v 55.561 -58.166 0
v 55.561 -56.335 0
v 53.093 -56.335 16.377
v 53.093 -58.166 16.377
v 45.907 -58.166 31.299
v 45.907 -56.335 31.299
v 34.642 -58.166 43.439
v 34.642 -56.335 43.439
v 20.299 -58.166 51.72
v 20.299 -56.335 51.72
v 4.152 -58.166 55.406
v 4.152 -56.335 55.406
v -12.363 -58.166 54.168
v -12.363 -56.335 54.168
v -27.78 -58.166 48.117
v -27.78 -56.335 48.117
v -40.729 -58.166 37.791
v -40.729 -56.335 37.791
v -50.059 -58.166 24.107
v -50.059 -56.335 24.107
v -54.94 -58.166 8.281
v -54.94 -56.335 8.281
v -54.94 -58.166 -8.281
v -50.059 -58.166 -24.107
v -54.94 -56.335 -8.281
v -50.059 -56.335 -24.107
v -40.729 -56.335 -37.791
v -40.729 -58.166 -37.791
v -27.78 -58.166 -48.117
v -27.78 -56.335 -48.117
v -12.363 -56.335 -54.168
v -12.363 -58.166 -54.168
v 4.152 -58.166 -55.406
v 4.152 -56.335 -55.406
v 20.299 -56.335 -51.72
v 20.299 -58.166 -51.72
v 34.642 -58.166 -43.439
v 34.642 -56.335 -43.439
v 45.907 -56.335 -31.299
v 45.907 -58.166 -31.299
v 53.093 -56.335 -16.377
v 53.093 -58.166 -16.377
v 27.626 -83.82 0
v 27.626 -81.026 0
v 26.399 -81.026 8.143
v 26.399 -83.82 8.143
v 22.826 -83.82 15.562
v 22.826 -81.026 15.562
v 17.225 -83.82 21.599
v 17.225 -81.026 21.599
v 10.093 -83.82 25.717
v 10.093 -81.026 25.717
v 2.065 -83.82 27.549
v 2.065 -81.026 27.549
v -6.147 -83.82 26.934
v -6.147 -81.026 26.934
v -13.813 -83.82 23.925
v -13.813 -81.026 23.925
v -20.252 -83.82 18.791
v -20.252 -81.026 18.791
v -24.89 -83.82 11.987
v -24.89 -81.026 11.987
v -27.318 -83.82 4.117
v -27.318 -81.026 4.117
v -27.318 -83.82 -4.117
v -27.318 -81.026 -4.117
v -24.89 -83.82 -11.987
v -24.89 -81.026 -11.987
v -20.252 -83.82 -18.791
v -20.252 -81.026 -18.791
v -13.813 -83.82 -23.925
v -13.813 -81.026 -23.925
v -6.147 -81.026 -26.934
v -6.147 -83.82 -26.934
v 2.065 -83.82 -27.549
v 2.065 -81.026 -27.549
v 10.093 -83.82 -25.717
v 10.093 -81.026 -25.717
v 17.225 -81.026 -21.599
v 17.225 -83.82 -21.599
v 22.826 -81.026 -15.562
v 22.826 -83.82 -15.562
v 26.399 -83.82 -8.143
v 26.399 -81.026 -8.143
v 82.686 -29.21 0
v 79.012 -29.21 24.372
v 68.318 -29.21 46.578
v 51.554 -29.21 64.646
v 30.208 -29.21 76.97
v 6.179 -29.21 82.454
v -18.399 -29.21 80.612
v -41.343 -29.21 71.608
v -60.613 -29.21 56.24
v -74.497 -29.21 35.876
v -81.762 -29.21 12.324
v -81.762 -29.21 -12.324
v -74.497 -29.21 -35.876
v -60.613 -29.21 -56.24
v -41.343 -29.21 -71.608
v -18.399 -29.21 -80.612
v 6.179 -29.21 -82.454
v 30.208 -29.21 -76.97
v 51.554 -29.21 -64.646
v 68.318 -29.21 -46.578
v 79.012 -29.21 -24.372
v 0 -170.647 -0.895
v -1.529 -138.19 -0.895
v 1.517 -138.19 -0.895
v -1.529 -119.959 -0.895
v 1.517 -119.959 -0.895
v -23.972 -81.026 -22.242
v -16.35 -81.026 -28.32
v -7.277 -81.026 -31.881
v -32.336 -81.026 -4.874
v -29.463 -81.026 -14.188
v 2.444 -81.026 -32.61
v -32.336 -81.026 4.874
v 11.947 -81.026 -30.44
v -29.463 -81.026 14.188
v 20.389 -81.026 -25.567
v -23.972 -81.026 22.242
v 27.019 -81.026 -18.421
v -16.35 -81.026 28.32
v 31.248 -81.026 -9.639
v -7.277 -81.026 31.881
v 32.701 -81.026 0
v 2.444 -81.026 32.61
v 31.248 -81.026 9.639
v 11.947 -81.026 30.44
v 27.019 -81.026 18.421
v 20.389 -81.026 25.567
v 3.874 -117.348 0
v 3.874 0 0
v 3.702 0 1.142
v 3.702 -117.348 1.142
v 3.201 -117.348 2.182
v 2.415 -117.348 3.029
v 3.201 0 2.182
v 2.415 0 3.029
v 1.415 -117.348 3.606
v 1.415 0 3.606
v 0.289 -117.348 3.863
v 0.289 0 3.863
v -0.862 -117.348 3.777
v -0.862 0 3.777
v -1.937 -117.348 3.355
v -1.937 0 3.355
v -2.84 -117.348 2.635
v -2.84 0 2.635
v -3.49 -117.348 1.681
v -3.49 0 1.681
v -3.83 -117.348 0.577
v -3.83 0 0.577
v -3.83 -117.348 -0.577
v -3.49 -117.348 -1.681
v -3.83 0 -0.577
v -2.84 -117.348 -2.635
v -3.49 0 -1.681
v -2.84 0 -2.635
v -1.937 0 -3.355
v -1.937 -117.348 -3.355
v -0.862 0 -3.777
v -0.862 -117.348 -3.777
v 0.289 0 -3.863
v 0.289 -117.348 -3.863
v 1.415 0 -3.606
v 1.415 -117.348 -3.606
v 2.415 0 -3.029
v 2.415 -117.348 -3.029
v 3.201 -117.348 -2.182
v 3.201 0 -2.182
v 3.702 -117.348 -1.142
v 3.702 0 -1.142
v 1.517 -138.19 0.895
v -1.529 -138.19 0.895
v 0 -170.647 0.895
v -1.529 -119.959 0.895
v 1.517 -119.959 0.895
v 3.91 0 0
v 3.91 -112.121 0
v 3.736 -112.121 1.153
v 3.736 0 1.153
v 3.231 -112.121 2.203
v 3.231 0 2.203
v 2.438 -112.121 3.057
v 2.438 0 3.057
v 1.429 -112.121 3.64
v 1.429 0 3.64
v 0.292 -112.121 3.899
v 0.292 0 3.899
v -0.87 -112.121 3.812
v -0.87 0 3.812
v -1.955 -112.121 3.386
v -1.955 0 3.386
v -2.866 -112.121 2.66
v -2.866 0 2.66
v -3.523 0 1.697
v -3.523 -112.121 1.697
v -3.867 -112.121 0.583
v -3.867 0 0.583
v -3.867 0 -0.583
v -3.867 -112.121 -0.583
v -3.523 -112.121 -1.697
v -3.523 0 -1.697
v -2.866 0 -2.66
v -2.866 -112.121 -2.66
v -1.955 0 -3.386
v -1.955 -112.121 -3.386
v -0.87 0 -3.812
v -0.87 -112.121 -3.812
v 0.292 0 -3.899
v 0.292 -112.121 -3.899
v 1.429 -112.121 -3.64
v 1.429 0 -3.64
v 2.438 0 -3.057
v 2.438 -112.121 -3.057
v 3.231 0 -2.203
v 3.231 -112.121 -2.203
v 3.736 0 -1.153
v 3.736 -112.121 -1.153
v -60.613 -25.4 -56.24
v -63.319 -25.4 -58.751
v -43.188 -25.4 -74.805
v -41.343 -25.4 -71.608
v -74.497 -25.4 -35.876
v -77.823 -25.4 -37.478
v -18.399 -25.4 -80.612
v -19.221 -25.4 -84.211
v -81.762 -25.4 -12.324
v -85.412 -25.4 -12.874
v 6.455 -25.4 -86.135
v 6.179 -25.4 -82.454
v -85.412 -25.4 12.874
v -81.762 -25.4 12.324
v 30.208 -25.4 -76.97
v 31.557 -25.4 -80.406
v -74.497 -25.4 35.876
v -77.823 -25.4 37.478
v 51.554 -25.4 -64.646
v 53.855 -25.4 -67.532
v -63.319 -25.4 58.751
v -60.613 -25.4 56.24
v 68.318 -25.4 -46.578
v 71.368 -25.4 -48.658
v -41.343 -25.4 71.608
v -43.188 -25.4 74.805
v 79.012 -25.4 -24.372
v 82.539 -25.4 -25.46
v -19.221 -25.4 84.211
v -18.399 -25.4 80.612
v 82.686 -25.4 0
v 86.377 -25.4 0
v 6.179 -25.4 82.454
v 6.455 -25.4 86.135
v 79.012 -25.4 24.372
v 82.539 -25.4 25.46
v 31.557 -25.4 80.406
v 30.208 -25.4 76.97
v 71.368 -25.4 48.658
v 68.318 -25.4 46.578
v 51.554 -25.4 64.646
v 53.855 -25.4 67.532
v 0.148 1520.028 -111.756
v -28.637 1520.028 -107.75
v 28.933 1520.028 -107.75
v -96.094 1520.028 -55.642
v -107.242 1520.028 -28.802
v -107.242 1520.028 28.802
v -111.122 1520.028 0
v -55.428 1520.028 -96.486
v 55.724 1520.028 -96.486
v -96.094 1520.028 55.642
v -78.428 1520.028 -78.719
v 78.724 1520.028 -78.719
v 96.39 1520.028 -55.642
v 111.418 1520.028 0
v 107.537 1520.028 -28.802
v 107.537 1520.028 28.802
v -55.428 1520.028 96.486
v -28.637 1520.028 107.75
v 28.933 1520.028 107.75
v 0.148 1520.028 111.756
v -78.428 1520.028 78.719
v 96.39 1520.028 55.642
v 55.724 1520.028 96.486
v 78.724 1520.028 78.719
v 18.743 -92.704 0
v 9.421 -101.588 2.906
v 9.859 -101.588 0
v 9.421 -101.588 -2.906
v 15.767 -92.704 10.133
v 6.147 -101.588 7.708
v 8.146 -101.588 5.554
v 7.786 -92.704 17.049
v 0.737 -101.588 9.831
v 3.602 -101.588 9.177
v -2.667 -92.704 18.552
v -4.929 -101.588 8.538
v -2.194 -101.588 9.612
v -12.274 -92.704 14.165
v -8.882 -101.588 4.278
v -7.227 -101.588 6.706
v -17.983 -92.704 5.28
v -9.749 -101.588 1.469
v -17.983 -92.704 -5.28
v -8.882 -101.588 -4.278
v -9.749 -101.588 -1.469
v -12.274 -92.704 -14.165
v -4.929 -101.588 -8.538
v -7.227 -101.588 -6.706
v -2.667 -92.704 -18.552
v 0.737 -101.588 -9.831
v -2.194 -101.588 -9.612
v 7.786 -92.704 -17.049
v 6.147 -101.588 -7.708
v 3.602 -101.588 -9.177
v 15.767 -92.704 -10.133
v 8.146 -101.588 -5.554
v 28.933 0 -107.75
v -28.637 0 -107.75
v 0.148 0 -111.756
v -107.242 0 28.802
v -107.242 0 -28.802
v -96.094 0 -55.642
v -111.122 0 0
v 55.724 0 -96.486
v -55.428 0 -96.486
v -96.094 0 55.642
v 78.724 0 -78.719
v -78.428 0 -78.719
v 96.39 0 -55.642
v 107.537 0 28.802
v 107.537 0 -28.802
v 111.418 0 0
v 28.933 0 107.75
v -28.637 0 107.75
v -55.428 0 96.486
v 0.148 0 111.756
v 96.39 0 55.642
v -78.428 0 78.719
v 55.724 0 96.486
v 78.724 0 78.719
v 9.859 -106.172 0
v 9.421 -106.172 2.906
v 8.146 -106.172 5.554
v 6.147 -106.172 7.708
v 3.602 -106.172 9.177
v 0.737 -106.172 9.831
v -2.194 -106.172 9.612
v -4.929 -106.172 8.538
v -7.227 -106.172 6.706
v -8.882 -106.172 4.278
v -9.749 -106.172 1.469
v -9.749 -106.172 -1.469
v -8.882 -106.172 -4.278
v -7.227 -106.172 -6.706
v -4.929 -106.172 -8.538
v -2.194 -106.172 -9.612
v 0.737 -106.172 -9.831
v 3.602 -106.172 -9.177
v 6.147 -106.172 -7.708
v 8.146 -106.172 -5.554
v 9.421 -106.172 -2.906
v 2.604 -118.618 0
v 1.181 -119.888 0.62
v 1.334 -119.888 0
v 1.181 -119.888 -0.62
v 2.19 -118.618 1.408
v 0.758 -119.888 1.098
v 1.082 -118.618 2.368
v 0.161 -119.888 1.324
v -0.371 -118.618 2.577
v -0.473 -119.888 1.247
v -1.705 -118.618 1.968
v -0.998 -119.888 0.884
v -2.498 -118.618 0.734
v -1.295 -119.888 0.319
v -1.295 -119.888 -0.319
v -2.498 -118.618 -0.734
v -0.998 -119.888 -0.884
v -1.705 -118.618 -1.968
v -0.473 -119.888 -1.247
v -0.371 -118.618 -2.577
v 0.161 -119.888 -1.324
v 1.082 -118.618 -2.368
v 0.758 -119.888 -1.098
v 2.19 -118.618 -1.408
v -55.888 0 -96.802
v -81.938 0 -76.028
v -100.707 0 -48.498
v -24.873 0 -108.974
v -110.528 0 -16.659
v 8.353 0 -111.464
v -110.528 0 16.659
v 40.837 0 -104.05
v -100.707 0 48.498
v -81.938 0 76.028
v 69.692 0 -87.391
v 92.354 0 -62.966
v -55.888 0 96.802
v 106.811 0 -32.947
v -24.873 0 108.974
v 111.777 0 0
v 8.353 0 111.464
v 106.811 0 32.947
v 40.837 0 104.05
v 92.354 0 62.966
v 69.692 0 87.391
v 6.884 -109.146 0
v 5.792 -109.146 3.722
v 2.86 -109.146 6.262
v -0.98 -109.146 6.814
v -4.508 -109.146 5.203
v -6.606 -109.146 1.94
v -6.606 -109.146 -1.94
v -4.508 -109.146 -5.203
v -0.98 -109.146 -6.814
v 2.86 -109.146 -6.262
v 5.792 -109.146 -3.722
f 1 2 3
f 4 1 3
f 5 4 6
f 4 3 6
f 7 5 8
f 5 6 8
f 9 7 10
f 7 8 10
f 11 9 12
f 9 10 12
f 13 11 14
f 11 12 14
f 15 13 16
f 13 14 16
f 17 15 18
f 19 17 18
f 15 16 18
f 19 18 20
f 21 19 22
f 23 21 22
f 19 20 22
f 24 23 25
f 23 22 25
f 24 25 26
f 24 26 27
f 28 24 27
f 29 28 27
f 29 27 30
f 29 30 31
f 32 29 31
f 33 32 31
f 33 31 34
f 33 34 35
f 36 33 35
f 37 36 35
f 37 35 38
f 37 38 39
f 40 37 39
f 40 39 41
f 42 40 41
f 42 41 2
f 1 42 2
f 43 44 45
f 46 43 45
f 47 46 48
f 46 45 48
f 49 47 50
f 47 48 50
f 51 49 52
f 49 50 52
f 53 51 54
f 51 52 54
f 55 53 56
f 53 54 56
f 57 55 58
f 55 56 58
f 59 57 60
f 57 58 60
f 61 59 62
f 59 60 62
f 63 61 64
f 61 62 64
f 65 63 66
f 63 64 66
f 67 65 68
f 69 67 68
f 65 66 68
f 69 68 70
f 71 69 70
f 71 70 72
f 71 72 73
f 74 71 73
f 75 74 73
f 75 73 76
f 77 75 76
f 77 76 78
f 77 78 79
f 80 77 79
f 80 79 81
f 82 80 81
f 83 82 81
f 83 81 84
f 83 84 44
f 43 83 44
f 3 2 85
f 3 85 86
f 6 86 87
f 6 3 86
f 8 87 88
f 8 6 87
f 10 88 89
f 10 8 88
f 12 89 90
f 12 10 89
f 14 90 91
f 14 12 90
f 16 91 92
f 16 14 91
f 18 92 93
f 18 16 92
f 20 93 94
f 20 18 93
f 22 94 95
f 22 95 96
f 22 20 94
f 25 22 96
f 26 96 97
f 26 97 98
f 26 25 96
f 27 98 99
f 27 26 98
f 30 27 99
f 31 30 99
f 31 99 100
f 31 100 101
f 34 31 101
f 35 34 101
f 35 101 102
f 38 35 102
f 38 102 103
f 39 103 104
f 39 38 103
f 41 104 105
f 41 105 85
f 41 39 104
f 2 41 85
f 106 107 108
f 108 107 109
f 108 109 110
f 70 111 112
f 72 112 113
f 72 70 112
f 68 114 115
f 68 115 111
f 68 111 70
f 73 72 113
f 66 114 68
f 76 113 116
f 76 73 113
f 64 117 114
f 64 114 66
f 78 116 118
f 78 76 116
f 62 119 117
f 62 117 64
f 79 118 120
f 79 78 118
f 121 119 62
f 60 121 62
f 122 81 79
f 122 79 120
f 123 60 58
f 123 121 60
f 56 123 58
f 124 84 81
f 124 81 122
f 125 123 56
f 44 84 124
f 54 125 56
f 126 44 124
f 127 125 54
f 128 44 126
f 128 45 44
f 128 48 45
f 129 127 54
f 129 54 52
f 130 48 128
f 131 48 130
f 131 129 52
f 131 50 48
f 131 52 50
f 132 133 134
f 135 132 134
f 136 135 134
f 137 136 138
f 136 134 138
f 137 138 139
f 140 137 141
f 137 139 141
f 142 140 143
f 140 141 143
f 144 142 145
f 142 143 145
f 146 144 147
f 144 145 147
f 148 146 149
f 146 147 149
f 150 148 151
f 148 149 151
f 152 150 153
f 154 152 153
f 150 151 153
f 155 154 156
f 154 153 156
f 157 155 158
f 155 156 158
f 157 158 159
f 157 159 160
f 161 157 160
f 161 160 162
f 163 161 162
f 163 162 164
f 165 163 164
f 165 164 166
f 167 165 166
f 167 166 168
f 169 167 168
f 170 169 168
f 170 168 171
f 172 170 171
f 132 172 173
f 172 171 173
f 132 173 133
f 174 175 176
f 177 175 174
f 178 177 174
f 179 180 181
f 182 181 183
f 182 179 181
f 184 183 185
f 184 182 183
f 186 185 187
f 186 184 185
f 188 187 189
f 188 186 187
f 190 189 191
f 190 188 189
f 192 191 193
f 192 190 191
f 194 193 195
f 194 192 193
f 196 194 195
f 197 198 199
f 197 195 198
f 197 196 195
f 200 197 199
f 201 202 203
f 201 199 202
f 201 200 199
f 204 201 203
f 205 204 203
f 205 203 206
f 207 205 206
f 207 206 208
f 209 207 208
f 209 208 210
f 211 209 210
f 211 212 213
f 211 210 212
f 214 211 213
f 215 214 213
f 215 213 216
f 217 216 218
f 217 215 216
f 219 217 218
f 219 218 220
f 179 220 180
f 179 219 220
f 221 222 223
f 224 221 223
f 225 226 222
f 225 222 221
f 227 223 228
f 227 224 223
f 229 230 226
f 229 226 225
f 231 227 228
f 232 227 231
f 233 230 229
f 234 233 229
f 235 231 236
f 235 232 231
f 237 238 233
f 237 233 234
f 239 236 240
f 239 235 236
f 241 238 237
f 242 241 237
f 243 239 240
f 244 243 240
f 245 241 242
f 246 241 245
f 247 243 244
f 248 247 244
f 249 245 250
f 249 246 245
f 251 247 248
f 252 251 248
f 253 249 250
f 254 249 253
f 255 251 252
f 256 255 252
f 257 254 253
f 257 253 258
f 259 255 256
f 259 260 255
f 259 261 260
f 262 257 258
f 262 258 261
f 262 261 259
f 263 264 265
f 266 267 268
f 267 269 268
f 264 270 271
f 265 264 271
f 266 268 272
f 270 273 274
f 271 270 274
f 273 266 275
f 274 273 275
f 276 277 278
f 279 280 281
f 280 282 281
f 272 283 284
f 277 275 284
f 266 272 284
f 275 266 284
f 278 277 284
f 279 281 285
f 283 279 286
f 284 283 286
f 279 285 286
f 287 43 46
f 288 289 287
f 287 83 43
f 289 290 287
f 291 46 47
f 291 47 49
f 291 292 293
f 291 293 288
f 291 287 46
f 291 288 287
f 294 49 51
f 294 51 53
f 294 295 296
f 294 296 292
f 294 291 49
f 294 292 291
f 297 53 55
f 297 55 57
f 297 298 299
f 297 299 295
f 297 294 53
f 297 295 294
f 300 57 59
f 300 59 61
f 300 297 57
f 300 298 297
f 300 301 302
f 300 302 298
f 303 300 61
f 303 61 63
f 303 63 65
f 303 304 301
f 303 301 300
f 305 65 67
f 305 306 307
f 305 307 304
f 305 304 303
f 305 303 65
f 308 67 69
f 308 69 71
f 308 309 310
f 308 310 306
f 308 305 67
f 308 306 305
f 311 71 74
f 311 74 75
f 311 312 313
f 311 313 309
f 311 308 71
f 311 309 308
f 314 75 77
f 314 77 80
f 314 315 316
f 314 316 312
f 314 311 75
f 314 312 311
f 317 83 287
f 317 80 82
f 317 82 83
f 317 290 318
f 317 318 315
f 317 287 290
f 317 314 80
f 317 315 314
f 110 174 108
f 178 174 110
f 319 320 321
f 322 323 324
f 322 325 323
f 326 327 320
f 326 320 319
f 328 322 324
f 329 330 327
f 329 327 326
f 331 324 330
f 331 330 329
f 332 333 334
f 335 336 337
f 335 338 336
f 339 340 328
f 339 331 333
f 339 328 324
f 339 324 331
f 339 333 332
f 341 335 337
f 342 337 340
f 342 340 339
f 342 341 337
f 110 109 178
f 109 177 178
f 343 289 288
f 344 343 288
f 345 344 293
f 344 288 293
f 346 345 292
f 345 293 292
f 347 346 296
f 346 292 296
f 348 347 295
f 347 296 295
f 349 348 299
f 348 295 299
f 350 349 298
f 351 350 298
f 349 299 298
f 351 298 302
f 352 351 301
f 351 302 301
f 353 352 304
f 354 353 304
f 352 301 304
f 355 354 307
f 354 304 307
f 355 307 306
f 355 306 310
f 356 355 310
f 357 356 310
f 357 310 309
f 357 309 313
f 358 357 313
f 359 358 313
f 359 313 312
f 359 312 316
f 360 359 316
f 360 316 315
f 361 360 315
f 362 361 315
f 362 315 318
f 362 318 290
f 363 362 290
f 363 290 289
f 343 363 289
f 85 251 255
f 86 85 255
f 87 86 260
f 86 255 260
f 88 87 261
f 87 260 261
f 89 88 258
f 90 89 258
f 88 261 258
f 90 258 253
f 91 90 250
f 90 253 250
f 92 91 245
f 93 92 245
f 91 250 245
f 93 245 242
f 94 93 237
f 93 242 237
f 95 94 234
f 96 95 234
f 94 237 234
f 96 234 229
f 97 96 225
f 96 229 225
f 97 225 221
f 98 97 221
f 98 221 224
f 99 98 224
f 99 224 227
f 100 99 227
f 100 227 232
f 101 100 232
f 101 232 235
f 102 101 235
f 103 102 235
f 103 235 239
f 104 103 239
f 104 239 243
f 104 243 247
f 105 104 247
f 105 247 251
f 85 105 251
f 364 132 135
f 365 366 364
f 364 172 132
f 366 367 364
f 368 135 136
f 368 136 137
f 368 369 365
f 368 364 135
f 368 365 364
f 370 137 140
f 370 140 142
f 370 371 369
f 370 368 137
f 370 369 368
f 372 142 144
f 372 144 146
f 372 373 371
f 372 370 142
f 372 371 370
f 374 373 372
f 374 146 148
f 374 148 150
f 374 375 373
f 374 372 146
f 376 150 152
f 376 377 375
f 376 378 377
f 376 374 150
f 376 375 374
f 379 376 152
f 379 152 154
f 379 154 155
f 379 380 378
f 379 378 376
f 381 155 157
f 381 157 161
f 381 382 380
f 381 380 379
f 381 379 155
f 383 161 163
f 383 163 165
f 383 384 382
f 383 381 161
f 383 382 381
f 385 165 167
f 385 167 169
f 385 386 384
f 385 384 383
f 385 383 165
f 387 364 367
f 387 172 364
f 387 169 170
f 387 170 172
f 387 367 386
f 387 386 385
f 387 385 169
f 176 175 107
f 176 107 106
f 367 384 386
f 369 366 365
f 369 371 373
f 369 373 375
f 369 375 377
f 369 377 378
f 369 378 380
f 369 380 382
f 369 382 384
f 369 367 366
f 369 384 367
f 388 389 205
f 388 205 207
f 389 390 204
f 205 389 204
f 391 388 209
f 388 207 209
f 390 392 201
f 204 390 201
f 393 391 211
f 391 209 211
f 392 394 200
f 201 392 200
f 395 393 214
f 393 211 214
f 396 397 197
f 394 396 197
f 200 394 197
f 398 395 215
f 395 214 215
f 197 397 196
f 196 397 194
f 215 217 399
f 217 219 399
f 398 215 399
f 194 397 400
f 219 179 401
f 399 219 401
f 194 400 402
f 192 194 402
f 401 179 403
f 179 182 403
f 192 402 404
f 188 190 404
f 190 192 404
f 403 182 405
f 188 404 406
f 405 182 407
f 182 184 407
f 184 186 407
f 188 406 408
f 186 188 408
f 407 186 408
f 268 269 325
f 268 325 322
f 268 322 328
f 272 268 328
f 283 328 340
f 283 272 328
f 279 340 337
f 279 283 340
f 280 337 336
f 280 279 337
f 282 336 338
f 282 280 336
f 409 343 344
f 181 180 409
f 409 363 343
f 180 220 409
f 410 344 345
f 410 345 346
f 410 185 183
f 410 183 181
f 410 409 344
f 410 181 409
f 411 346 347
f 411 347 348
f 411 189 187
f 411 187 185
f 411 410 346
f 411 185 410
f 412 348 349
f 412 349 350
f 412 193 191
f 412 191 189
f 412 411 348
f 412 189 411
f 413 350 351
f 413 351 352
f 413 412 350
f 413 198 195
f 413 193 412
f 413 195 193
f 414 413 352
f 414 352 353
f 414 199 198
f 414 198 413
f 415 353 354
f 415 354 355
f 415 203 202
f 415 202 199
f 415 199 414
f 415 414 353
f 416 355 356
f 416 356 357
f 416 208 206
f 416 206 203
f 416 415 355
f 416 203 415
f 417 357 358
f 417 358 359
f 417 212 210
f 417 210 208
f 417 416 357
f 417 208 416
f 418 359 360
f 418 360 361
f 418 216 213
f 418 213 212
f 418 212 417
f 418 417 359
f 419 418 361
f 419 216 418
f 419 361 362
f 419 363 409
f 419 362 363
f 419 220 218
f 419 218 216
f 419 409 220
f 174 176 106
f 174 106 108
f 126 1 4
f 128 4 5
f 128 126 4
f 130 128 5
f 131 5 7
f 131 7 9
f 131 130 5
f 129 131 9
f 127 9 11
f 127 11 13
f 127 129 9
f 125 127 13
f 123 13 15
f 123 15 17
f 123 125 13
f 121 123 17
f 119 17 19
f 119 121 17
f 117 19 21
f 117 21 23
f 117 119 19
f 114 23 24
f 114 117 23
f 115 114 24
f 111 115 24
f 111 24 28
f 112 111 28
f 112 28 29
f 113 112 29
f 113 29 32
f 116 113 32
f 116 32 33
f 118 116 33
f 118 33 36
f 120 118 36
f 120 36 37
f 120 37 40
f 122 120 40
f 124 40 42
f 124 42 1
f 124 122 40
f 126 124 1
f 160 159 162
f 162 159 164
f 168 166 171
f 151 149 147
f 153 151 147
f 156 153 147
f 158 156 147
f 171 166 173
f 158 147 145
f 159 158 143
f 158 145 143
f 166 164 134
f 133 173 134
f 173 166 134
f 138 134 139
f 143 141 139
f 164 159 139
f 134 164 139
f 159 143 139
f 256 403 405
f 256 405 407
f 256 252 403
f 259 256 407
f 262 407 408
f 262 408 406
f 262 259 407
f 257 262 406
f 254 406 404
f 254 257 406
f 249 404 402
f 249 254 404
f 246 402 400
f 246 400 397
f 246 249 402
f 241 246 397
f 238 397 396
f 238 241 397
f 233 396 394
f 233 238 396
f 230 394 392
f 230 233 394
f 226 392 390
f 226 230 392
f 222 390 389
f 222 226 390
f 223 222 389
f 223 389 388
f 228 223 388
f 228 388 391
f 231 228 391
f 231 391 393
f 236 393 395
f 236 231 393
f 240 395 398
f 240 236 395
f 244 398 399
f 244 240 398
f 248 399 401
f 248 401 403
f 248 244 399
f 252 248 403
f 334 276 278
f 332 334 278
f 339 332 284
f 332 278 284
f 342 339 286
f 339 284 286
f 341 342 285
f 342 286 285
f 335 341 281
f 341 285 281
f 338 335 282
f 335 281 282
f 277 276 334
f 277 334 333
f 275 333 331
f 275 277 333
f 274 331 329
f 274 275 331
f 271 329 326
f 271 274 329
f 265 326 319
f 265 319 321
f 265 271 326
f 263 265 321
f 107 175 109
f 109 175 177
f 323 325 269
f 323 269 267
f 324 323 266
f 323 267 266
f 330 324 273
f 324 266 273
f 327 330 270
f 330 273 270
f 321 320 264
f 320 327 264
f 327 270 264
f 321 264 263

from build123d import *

# Parameters (mm, degrees)
F0_R         = 116.8568622496
F0_R_2       = 82.6855352884
F1_DEPTH     = 25.4
F0_R_3       = 55.5609891669
F3_DEPTH     = 57.15
F0_R_4       = 27.6263375127
F5_DEPTH     = 81.026
F6_SIZE      = 22.86
F0_R_5       = 9.8587759807
F7_DEPTH     = 109.22
F0_R_6       = 3.9101861175
F9_DEPTH     = 113.792
F11_R        = 3.8737007973
F12_DEPTH    = 119.888
F13_SIZE     = 2.54
F14_W        = 222.5426733494
F14_H        = 1520.0280845165
F15_DEPTH    = 111.76
F16_T1_DEPTH = 2081.1154585477
F17_W        = 3.0455216765
F17_H        = 18.2308778167
F18_DEPTH    = 0.8952179924


# Not quite as in the source:
# - a fillet or chamfer that OpenCascade refuses, or shapes differently, is made with other operations: its cross-section is extruded or revolved along the edge and cut away or added


with BuildPart() as f1:
    # F0 (on Front) → F1 (new body)
    with BuildSketch(Plane.XZ):
        Circle(F0_R)
        Circle(F0_R_2, mode=Mode.SUBTRACT)
    extrude(amount=F1_DEPTH)

    # F2: chamfer of 30.48 on 1 edges, made by hand

    # F2_s1 → F2_t2 (revolve, cut)
    with BuildSketch(Plane.XY):
        Polygon((116.8568622496, 5.08), (86.3768622496, -25.4), (116.8568622496, -25.4), align=None)
    revolve(axis=Axis((0, -25.4, 0), (0, -1, 0)), mode=Mode.SUBTRACT)

    # F0 (on Front) → F3 (join)
    with BuildSketch(Plane.XZ):
        Circle(F0_R_2)
        Circle(F0_R_3, mode=Mode.SUBTRACT)
    extrude(amount=F3_DEPTH)

    # F4: chamfer of 27.94 on 1 edges, made by hand

    # F4_s1 → F4_t2 (revolve, cut)
    with BuildSketch(Plane.XY):
        Polygon((82.6855352884, -29.21), (54.7455352884, -57.15), (82.6855352884, -57.15), align=None)
    revolve(axis=Axis((0, -57.15, 0), (0, -1, 0)), mode=Mode.SUBTRACT)

    # F0 (on Front) → F5 (join)
    with BuildSketch(Plane.XZ):
        Circle(F0_R_3)
        Circle(F0_R_4, mode=Mode.SUBTRACT)
    extrude(amount=F5_DEPTH)

    # F6
    f6_edges = [f1.edges().sort_by_distance(p)[0] for p in [
        (-55.560989, -81.026, 0),
    ]]
    chamfer(f6_edges, length=F6_SIZE)

    # F0 (on Front) → F7 (join)
    with BuildSketch(Plane.XZ):
        Circle(F0_R_4)
        Circle(F0_R_5, mode=Mode.SUBTRACT)
    extrude(amount=F7_DEPTH)

    # F8: chamfer of 25.4 on 1 edges, made by hand

    # F8_s1 → F8_t2 (revolve, cut)
    with BuildSketch(Plane.XY):
        Polygon((27.6263375127, -83.82), (2.2263375127, -109.22), (27.6263375127, -109.22), align=None)
    revolve(axis=Axis((0, -109.22, 0), (0, -1, 0)), mode=Mode.SUBTRACT)

    # F0 (on Front) → F9 (join)
    with BuildSketch(Plane.XZ):
        Circle(F0_R_5)
        Circle(F0_R_6, mode=Mode.SUBTRACT)
    extrude(amount=F9_DEPTH)

    # F10: chamfer of 7.62 on 1 edges, made by hand

    # F10_s1 → F10_t2 (revolve, cut)
    with BuildSketch(Plane.XY):
        Polygon((9.8587759807, -106.172), (2.2387759807, -113.792), (9.8587759807, -113.792), align=None)
    revolve(axis=Axis((0, -113.792, 0), (0, -1, 0)), mode=Mode.SUBTRACT)


with BuildPart() as f12:
    # F11 (on face) → F12 (new body)
    with BuildSketch(Plane.XZ):
        Circle(F11_R)
    extrude(amount=F12_DEPTH)

    # F13
    f13_edges = [f12.edges().sort_by_distance(p)[0] for p in [
        (-3.873701, -119.888, 0),
    ]]
    chamfer(f13_edges, length=F13_SIZE)


with BuildPart() as f15:
    # F14 (on Top) → F15 (new body, symmetric)
    with BuildSketch(Plane.XY):
        with Locations((0.1479163766, 760.0140422583)):
            Rectangle(F14_W, F14_H)
    extrude(amount=F15_DEPTH, both=True)

    # F16: fillet of radius 112.2174748062 on 4 edges, made by hand

    # F16_s2 → F16_t1 (cut)
    with BuildSketch(Plane.XZ.offset(-1800.5717715321)):
        with BuildLine():
            ThreePointArc((-111.1234202981, 0.4574748062), (-78.255682895, -78.8922625969), (1.0940545081, -111.76))
            Line((1.0940545081, -111.76), (-111.1234202981, -111.76))
            Line((-111.1234202981, -111.76), (-111.1234202981, 0.4574748062))
        make_face()
        with BuildLine():
            ThreePointArc((111.4192530513, 0.4574748062), (78.5515156482, -78.8922625969), (-0.7982217549, -111.76))
            Line((-0.7982217549, -111.76), (111.4192530513, -111.76))
            Line((111.4192530513, -111.76), (111.4192530513, 0.4574748062))
        make_face()
        with BuildLine():
            ThreePointArc((111.4192530513, -0.4574748062), (78.5515156482, 78.8922625969), (-0.7982217549, 111.76))
            Line((-0.7982217549, 111.76), (111.4192530513, 111.76))
            Line((111.4192530513, 111.76), (111.4192530513, -0.4574748062))
        make_face()
        with BuildLine():
            ThreePointArc((-111.1234202981, -0.4574748062), (-78.255682895, 78.8922625969), (1.0940545081, 111.76))
            Line((1.0940545081, 111.76), (-111.1234202981, 111.76))
            Line((-111.1234202981, 111.76), (-111.1234202981, -0.4574748062))
        make_face()
    extrude(amount=F16_T1_DEPTH, mode=Mode.SUBTRACT)


with BuildPart() as f18:
    # F17 (on Top) → F18 (new body, symmetric)
    with BuildSketch(Plane.XY):
        with Locations((-0.0058300793, -129.0746219456)):
            Rectangle(F17_W, F17_H)
        Polygon((1.516930759, -138.190060854), (-1.5285909176, -138.190060854), (0, -170.647457242), align=None)
    extrude(amount=F18_DEPTH, both=True)


solid = Compound([f1.part, f12.part, f15.part, f18.part])
